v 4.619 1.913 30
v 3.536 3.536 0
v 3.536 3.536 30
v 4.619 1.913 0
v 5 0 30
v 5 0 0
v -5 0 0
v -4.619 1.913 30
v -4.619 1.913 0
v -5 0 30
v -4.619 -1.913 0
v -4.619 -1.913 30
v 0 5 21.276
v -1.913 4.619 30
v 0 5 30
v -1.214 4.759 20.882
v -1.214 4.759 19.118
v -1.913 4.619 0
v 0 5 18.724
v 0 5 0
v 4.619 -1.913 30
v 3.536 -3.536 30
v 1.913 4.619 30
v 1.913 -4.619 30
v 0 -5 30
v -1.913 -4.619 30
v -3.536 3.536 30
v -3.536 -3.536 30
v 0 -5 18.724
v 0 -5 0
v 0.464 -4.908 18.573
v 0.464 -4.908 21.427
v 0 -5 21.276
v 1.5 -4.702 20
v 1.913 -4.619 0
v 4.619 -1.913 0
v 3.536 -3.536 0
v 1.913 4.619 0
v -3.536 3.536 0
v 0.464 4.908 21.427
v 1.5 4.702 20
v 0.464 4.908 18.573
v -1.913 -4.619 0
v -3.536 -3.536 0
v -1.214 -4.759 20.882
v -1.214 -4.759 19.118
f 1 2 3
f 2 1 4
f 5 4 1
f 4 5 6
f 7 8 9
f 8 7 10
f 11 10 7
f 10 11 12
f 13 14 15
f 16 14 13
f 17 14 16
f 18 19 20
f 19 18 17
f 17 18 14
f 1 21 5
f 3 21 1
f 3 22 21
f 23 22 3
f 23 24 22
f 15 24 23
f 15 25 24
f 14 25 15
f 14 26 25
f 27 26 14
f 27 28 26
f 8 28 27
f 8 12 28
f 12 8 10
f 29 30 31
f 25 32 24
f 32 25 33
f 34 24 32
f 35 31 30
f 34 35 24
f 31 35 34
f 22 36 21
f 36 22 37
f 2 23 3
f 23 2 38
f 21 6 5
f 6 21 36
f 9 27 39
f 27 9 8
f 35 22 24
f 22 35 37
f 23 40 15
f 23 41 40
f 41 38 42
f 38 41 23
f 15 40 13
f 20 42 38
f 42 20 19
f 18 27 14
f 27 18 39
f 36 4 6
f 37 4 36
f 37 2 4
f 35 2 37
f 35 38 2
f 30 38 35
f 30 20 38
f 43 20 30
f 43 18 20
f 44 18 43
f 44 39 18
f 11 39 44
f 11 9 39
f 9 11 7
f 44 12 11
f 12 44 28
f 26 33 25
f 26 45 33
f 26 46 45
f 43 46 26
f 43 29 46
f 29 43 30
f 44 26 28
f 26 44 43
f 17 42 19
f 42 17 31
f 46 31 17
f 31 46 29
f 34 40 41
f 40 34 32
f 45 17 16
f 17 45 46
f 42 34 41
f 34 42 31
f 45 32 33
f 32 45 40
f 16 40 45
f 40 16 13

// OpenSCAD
// The exact-geometry audit's case c12 (docs/audits/exact-geometry-rust.md).
// volume: 2286.313079308426
difference() { cylinder(r=5, h=30); translate([0,0,20]) rotate([90,0,0]) cylinder(r=1.5, h=12, center=true); }
